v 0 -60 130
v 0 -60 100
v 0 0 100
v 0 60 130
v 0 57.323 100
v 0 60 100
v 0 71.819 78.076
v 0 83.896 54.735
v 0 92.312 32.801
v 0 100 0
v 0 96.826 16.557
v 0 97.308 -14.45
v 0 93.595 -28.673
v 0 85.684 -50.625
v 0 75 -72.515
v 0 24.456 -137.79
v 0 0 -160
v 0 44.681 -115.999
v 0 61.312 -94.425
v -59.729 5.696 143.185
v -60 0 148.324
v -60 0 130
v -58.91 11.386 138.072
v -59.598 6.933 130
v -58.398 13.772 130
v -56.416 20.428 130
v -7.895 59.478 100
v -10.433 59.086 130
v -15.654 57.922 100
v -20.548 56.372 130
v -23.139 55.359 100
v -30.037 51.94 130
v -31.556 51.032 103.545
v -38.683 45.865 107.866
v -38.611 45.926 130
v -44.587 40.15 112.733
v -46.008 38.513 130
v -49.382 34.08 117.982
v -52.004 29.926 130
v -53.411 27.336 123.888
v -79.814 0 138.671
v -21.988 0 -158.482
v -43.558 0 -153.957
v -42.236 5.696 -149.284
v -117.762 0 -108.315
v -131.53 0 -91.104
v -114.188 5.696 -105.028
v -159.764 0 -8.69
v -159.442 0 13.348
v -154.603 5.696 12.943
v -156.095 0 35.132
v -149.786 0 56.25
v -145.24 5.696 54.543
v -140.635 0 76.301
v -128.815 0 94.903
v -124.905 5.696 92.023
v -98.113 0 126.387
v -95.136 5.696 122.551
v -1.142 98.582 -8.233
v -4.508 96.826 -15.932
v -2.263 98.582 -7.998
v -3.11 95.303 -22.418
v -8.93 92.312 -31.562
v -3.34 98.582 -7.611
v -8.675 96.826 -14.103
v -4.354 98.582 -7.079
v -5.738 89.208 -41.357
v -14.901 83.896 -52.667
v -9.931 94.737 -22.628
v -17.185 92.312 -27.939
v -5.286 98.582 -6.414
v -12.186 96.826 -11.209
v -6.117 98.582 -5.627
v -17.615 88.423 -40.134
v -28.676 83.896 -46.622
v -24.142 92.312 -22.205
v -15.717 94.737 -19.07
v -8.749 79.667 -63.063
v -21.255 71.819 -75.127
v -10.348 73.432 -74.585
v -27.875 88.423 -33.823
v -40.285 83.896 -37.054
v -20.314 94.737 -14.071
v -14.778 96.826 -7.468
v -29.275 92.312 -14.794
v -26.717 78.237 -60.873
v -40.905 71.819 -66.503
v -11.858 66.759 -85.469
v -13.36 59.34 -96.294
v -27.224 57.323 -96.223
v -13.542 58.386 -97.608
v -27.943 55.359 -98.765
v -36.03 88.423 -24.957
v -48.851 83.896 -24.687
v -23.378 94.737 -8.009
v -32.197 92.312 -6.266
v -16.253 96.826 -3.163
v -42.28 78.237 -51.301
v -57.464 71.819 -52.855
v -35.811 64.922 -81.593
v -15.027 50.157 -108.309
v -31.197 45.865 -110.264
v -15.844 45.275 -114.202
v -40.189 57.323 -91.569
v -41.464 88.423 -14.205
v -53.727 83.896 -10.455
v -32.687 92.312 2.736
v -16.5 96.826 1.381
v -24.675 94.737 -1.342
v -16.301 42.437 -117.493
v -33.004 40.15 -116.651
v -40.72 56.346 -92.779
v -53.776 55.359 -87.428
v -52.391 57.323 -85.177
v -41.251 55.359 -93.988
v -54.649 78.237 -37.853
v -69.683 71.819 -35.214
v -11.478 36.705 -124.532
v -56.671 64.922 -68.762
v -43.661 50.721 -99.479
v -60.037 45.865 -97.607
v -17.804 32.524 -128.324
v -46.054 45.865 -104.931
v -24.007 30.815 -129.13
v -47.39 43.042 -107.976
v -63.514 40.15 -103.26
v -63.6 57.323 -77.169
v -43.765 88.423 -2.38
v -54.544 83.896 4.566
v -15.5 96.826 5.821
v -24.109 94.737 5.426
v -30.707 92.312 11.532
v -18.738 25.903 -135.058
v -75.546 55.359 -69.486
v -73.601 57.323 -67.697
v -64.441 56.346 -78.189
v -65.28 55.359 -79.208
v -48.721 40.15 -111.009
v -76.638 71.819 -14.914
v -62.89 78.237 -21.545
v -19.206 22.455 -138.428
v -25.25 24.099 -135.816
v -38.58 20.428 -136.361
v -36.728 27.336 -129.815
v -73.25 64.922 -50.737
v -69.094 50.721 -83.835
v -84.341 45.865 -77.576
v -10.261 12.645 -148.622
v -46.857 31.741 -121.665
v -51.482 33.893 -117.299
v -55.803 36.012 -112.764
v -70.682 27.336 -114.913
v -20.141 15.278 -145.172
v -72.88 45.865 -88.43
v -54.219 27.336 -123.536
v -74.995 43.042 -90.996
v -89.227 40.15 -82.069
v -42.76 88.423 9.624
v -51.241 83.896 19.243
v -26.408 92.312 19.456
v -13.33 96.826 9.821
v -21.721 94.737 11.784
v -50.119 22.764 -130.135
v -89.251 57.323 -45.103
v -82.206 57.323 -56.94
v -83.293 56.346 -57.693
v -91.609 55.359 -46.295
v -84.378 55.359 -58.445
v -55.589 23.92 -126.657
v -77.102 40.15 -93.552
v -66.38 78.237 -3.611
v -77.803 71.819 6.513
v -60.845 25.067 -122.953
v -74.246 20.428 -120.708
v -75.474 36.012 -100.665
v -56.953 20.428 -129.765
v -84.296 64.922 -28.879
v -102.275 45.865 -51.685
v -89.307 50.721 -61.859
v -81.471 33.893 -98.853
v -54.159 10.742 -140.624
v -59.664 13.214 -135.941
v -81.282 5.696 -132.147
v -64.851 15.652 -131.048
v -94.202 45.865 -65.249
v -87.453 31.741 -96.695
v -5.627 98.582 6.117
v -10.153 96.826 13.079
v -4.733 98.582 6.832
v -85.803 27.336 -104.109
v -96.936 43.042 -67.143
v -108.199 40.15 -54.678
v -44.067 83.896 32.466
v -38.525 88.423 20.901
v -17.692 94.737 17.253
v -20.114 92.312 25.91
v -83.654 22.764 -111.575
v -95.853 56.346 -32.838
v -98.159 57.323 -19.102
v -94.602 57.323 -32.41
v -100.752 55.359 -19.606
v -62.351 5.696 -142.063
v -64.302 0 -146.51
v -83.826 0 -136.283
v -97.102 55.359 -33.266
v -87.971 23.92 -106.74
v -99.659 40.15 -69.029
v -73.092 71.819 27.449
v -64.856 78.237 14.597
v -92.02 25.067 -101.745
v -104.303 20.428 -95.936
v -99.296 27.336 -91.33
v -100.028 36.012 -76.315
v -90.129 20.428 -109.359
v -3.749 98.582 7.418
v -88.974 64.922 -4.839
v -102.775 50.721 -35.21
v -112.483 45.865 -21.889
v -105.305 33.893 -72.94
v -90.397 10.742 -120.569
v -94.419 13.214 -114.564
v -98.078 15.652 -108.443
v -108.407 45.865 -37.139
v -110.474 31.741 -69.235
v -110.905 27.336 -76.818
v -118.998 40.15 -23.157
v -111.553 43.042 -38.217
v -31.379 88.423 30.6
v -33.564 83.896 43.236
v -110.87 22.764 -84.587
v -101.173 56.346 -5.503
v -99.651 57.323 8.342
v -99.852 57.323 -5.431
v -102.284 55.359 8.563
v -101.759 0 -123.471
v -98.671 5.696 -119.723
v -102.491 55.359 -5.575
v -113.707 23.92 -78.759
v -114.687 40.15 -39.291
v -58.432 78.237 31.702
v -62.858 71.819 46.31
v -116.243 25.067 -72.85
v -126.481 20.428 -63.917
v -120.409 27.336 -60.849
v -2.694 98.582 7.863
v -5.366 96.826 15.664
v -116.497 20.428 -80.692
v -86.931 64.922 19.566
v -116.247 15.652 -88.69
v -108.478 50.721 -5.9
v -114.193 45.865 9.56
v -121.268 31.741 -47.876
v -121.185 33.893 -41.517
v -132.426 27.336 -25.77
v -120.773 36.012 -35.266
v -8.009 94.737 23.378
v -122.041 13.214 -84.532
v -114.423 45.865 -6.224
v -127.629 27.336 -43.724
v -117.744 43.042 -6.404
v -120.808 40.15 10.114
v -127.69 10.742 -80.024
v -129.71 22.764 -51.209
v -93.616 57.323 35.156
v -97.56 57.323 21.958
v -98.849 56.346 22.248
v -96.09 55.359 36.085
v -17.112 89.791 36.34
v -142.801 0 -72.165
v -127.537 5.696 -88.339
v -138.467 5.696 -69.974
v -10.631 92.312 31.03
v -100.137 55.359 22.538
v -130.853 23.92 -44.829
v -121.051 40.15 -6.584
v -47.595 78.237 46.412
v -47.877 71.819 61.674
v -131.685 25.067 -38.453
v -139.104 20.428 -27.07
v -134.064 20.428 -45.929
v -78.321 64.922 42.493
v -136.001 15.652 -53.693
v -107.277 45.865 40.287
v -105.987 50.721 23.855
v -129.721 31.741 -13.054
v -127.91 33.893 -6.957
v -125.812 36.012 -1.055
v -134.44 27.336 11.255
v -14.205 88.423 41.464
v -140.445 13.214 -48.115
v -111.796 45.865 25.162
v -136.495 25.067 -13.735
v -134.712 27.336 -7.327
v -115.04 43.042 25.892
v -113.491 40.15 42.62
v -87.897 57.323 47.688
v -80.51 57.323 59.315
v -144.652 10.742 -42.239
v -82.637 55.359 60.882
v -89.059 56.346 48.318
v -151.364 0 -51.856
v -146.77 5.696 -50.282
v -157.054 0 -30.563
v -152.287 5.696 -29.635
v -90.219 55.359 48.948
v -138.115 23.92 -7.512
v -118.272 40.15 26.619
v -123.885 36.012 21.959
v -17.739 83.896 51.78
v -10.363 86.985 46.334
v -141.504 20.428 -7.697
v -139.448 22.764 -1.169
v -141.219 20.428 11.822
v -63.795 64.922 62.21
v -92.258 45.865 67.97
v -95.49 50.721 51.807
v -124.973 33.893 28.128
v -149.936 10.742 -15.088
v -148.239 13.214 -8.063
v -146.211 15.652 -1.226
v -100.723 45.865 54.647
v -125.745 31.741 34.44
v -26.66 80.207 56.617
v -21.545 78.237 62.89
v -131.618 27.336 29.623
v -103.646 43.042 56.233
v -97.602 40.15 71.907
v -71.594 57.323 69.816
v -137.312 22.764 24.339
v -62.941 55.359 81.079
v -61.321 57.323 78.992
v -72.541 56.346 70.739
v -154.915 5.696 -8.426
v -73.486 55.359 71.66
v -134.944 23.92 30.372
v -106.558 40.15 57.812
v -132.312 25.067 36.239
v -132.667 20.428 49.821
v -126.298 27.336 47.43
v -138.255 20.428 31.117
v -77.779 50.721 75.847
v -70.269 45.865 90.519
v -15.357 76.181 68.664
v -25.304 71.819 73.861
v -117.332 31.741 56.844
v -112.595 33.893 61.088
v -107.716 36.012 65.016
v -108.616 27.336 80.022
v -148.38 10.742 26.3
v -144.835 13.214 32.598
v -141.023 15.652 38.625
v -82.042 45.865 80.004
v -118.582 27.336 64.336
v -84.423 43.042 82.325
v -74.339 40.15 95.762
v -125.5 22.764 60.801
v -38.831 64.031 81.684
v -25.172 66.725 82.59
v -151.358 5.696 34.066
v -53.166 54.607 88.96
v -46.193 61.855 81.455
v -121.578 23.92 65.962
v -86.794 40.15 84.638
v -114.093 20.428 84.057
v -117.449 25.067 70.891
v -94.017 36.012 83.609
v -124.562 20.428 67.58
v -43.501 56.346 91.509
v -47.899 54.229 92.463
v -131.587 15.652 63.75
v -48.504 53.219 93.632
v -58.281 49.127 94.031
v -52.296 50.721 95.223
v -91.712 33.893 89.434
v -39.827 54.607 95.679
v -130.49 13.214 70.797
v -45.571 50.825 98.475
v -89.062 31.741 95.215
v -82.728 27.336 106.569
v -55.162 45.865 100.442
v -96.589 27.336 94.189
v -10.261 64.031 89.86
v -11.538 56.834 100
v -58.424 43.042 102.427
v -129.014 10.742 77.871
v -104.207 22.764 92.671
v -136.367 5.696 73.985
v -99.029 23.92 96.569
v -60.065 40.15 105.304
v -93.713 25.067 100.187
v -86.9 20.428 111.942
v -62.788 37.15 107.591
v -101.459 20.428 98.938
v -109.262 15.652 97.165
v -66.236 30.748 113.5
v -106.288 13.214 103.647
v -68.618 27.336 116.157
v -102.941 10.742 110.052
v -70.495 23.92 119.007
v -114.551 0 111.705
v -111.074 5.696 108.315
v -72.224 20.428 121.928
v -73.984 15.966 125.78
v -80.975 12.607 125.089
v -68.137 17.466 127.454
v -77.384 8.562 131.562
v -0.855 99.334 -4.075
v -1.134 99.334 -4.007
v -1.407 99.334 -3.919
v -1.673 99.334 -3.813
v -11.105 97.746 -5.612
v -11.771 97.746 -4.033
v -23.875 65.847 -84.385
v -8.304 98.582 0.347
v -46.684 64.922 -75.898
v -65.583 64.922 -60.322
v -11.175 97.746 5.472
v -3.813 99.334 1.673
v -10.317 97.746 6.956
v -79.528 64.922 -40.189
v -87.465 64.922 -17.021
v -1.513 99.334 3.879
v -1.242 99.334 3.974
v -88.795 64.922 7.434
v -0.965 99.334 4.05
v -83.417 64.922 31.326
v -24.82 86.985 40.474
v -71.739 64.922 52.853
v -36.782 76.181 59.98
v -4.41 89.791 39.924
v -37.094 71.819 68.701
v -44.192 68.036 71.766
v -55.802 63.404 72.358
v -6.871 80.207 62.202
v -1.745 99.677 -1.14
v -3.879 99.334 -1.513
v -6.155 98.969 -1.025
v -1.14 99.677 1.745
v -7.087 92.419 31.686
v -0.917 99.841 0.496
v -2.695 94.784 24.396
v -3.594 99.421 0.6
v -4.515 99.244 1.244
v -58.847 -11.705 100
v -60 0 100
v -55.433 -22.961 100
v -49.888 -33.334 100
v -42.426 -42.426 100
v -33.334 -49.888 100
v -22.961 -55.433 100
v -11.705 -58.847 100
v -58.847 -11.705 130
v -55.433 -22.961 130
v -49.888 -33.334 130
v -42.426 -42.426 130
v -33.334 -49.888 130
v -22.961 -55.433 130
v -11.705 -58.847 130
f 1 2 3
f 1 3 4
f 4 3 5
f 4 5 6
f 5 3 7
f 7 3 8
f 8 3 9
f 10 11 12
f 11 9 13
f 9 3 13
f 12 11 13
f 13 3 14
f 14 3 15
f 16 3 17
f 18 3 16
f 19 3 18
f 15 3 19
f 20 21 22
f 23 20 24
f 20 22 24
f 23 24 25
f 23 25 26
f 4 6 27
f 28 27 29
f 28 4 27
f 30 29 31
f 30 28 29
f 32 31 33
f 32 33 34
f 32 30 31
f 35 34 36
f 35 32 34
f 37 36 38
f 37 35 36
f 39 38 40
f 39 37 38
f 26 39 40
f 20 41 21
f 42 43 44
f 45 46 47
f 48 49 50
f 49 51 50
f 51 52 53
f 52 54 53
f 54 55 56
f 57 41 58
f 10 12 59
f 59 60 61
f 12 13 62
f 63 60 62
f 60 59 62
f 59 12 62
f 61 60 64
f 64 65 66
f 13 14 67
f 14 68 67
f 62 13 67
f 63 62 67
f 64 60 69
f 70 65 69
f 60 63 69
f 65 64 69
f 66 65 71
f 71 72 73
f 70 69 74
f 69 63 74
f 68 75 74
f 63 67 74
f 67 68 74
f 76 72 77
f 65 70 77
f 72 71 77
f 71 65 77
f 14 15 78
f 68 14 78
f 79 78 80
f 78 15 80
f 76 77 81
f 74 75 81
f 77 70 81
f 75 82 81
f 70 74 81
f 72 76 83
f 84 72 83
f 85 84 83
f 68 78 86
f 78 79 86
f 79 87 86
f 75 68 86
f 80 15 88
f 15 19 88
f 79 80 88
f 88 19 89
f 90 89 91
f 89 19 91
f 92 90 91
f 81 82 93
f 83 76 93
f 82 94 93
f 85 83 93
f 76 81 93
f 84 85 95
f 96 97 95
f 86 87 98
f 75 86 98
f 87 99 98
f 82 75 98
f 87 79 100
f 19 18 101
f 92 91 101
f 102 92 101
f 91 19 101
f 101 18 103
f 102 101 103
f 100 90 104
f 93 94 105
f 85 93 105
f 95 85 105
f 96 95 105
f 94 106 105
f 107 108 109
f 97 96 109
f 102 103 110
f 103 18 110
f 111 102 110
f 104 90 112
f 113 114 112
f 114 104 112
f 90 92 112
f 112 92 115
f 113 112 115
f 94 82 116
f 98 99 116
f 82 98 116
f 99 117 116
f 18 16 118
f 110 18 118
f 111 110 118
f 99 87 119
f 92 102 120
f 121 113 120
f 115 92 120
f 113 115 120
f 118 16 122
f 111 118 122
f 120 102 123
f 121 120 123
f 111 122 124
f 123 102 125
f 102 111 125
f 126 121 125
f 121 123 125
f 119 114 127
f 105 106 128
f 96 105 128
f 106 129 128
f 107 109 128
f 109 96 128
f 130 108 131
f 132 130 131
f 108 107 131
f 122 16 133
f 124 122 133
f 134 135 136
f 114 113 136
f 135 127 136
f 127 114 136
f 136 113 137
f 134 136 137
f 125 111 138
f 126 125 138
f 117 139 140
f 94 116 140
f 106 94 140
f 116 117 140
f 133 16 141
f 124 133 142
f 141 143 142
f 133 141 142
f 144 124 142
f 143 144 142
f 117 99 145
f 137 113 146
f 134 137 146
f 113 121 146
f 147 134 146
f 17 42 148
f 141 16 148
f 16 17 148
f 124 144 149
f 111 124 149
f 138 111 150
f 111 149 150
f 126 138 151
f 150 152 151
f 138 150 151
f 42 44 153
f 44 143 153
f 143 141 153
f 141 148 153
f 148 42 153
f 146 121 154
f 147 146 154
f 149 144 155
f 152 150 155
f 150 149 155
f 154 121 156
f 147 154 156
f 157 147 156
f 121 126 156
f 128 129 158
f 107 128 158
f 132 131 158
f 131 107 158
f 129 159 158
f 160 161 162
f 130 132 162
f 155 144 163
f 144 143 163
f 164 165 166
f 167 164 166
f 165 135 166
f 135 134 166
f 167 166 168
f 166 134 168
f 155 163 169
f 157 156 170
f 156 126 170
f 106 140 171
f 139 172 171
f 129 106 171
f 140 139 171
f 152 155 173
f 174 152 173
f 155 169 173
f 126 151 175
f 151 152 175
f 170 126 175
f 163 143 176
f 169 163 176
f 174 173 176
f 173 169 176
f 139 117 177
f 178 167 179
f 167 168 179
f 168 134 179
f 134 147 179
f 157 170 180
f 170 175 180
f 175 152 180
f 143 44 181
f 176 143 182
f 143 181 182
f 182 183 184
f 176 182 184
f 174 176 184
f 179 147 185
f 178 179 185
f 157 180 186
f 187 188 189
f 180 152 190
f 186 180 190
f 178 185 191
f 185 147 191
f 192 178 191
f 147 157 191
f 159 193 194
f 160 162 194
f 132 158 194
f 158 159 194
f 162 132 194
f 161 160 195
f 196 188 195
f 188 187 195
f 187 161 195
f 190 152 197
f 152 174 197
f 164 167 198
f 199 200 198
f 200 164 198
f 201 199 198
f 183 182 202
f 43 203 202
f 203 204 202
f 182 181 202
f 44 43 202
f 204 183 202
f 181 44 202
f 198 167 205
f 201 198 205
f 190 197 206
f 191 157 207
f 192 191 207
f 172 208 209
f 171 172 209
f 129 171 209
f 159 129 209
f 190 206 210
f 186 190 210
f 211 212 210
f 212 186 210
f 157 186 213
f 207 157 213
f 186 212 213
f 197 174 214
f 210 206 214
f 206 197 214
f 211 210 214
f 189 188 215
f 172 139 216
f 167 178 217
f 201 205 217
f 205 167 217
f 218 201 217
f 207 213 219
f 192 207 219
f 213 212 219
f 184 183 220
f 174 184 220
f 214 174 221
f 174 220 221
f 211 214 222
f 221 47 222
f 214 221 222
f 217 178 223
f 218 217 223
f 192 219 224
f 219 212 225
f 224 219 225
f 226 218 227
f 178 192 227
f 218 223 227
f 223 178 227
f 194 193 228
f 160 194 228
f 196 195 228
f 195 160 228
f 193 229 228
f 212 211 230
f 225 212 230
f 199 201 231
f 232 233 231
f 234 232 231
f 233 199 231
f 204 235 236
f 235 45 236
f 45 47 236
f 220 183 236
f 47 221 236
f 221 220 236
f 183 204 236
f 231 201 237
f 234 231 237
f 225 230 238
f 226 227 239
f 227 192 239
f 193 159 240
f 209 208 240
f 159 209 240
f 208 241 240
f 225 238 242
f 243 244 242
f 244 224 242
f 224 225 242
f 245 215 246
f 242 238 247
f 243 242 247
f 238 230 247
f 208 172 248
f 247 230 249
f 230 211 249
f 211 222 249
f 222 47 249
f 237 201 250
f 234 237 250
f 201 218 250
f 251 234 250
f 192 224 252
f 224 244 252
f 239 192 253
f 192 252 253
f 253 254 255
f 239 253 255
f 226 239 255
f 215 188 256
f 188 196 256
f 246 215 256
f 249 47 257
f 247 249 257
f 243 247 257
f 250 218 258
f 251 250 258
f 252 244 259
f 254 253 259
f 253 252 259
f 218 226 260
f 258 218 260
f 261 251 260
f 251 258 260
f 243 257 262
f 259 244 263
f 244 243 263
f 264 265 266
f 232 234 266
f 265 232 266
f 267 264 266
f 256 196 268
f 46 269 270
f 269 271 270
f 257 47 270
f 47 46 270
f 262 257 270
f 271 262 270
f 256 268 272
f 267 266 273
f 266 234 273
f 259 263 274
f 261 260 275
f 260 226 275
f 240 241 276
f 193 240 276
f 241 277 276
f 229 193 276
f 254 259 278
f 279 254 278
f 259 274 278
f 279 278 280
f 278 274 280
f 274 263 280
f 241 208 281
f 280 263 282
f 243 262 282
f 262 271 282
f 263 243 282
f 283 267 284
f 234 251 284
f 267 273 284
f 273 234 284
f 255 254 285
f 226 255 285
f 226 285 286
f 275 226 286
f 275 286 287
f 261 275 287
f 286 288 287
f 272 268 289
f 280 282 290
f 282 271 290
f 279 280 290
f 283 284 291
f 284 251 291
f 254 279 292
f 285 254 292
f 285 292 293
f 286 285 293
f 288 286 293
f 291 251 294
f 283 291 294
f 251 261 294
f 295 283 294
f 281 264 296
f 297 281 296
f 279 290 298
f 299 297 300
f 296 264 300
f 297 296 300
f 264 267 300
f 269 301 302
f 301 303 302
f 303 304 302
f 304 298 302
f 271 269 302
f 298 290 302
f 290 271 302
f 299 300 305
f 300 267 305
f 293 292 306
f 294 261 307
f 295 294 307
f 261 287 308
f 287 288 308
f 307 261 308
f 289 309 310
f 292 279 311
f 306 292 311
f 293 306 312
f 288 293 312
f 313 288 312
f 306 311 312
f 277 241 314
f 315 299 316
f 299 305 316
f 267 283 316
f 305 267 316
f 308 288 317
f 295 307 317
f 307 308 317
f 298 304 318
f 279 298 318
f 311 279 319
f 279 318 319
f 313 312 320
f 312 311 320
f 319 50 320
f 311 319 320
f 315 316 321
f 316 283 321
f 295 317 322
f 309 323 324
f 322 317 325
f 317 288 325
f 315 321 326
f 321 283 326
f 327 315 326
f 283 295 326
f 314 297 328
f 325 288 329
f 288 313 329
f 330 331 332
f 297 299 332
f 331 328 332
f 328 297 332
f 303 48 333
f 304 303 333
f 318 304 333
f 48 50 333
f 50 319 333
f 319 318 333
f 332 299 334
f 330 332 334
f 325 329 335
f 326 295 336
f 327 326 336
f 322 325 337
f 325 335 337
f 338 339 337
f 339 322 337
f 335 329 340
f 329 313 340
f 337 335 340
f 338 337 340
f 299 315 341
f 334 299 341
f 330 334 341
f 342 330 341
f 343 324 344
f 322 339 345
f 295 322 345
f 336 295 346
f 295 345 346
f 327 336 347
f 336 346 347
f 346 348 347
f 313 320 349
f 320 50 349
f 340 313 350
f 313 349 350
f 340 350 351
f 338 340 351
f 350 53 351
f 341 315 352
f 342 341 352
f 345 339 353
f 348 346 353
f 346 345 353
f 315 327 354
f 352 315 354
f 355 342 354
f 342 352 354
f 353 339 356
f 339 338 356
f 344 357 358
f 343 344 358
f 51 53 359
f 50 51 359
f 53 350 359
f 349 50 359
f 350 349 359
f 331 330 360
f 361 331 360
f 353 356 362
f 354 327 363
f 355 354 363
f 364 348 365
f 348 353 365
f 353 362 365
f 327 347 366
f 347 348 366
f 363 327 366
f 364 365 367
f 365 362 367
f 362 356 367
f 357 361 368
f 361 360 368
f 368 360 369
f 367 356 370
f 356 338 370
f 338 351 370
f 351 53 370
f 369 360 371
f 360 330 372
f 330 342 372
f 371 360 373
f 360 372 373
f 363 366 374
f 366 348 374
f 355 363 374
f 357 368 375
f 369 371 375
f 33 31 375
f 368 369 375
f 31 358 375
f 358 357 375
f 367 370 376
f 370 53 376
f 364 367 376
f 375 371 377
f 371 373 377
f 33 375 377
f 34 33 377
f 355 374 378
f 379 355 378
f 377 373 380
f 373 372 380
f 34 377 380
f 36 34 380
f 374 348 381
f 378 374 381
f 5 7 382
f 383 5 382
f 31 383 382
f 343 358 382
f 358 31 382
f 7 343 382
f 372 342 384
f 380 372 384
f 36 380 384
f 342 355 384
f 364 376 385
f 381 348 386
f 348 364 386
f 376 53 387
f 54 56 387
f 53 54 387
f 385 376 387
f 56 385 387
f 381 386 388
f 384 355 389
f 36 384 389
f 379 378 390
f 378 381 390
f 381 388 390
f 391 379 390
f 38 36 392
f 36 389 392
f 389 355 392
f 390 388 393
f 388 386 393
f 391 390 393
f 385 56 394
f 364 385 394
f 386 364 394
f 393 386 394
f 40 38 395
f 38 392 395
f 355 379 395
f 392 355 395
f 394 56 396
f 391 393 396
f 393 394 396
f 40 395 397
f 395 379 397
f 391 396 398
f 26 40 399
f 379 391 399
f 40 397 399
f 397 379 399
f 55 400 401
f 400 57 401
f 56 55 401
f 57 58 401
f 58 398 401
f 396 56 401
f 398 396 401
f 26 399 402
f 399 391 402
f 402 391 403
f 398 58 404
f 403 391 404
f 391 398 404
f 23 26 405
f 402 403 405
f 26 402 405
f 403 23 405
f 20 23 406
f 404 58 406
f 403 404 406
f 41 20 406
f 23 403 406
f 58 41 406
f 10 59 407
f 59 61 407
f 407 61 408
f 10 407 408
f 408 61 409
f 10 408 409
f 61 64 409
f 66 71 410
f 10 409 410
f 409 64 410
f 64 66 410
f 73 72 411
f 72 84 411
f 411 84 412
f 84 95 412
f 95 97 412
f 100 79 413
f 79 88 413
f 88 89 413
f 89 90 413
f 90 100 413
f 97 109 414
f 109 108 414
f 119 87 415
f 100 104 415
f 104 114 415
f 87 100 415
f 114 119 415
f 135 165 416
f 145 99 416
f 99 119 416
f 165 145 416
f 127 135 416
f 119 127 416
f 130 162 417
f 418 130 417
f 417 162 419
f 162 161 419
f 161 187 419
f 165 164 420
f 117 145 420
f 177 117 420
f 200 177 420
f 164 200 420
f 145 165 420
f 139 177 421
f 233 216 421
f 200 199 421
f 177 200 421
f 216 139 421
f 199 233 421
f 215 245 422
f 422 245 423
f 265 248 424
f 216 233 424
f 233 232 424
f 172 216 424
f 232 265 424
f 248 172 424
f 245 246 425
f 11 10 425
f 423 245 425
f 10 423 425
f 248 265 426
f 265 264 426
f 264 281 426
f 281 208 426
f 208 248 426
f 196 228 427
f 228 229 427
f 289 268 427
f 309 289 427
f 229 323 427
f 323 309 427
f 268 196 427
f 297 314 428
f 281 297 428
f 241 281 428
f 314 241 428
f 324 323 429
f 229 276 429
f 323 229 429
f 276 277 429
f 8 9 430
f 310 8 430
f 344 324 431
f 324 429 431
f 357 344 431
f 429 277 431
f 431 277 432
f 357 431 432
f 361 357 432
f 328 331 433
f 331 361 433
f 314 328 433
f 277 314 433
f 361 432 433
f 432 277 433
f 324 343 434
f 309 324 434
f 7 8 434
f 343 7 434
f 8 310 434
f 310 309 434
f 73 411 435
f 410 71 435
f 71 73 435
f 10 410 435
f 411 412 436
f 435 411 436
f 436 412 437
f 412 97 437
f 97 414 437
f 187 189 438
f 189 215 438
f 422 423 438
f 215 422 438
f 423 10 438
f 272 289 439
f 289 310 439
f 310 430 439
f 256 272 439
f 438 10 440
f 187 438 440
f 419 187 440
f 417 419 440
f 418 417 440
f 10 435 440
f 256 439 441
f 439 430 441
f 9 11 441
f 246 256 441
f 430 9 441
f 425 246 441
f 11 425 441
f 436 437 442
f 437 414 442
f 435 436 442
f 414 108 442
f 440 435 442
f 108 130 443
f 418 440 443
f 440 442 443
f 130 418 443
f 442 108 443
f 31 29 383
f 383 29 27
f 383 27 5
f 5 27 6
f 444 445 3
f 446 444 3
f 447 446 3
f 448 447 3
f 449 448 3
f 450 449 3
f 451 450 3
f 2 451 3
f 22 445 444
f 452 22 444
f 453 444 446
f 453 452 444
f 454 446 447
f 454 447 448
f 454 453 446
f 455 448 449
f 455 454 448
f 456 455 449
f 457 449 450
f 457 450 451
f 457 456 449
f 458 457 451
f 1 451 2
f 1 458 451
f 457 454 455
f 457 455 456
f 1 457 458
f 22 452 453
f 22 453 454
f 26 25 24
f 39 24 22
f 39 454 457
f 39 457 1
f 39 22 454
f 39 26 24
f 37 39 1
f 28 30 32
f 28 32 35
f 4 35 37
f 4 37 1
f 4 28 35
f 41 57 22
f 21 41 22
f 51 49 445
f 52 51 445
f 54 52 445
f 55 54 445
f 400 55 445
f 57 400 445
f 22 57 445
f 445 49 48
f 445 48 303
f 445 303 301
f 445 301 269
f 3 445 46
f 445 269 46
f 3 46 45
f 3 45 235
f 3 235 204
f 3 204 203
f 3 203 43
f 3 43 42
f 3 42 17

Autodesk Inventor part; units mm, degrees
ref_plane "YZ Plane" through (0, 0, 0) normal (1, 0, 0) x (0, 1, 0)
ref_plane "XZ Plane" through (0, 0, 0) normal (0, 1, 0) x (-1, 0, 0)
sketch "Esquisse1" plane through (0, 0, 0) normal (0, 0, 1) x (1, 0, 0)
  line L0 (0, 0) -> (160, 0) construction
  line L1 (0, 0) -> (0, 100) construction
  line L2 (0, 100) -> (87.1369, 86.9657) construction
  line L3 (87.1369, 86.9657) -> (160, 0) construction
  spline S0 degree 2 poles (0, 100) (87.1369, 86.9657) (160, 0) knots 1 1 1 2 2 2
  line L4 (0, 100) -> (0, 0)
  line L5 (0, 0) -> (160, 0)
  dimension "d0" = 160
  dimension "d1" = 100
revolve "Révolution1" add sketch "Esquisse1" angle 360 about axis through (0, 0, 0) along (0, 1, 0)
ref_plane "Plan de construction1" through (0, 0, 130) normal (0, 0, 1) x (1, 0, 0)
sketch "Esquisse3" plane through (0, 0, 130) normal (0, 0, 1) x (1, 0, 0)
  circle A0 centre (0, 0) radius 60
  dimension "d8" = 120
extrude "Extrusion2" add sketch "Esquisse3" against normal blind 30
sketch "Esquisse4" plane through (0, 0, 130) normal (0, 0, 1) x (1, 0, 0)
  circle A0 centre (0, 0) radius 60
  dimension "d11" = 120
extrude "Extrusion3" cut sketch "Esquisse4" along normal blind 30
sketch "Esquisse6" plane through (0, 0, 130) normal (0, 0, 1) x (1, 0, 0)
  line L0 (0, 105.5344) -> (175.5316, 105.5344)
  line L1 (175.5316, 105.5344) -> (175.5316, -202.4537)
  line L2 (175.5316, -202.4537) -> (0, -202.4537)
  line L3 (0, -202.4537) -> (0, 105.5344)
  point P0 (0, 0)
extrude "Extrusion5" cut sketch "Esquisse6" along normal mid plane 800
properties part number "RightSide"
